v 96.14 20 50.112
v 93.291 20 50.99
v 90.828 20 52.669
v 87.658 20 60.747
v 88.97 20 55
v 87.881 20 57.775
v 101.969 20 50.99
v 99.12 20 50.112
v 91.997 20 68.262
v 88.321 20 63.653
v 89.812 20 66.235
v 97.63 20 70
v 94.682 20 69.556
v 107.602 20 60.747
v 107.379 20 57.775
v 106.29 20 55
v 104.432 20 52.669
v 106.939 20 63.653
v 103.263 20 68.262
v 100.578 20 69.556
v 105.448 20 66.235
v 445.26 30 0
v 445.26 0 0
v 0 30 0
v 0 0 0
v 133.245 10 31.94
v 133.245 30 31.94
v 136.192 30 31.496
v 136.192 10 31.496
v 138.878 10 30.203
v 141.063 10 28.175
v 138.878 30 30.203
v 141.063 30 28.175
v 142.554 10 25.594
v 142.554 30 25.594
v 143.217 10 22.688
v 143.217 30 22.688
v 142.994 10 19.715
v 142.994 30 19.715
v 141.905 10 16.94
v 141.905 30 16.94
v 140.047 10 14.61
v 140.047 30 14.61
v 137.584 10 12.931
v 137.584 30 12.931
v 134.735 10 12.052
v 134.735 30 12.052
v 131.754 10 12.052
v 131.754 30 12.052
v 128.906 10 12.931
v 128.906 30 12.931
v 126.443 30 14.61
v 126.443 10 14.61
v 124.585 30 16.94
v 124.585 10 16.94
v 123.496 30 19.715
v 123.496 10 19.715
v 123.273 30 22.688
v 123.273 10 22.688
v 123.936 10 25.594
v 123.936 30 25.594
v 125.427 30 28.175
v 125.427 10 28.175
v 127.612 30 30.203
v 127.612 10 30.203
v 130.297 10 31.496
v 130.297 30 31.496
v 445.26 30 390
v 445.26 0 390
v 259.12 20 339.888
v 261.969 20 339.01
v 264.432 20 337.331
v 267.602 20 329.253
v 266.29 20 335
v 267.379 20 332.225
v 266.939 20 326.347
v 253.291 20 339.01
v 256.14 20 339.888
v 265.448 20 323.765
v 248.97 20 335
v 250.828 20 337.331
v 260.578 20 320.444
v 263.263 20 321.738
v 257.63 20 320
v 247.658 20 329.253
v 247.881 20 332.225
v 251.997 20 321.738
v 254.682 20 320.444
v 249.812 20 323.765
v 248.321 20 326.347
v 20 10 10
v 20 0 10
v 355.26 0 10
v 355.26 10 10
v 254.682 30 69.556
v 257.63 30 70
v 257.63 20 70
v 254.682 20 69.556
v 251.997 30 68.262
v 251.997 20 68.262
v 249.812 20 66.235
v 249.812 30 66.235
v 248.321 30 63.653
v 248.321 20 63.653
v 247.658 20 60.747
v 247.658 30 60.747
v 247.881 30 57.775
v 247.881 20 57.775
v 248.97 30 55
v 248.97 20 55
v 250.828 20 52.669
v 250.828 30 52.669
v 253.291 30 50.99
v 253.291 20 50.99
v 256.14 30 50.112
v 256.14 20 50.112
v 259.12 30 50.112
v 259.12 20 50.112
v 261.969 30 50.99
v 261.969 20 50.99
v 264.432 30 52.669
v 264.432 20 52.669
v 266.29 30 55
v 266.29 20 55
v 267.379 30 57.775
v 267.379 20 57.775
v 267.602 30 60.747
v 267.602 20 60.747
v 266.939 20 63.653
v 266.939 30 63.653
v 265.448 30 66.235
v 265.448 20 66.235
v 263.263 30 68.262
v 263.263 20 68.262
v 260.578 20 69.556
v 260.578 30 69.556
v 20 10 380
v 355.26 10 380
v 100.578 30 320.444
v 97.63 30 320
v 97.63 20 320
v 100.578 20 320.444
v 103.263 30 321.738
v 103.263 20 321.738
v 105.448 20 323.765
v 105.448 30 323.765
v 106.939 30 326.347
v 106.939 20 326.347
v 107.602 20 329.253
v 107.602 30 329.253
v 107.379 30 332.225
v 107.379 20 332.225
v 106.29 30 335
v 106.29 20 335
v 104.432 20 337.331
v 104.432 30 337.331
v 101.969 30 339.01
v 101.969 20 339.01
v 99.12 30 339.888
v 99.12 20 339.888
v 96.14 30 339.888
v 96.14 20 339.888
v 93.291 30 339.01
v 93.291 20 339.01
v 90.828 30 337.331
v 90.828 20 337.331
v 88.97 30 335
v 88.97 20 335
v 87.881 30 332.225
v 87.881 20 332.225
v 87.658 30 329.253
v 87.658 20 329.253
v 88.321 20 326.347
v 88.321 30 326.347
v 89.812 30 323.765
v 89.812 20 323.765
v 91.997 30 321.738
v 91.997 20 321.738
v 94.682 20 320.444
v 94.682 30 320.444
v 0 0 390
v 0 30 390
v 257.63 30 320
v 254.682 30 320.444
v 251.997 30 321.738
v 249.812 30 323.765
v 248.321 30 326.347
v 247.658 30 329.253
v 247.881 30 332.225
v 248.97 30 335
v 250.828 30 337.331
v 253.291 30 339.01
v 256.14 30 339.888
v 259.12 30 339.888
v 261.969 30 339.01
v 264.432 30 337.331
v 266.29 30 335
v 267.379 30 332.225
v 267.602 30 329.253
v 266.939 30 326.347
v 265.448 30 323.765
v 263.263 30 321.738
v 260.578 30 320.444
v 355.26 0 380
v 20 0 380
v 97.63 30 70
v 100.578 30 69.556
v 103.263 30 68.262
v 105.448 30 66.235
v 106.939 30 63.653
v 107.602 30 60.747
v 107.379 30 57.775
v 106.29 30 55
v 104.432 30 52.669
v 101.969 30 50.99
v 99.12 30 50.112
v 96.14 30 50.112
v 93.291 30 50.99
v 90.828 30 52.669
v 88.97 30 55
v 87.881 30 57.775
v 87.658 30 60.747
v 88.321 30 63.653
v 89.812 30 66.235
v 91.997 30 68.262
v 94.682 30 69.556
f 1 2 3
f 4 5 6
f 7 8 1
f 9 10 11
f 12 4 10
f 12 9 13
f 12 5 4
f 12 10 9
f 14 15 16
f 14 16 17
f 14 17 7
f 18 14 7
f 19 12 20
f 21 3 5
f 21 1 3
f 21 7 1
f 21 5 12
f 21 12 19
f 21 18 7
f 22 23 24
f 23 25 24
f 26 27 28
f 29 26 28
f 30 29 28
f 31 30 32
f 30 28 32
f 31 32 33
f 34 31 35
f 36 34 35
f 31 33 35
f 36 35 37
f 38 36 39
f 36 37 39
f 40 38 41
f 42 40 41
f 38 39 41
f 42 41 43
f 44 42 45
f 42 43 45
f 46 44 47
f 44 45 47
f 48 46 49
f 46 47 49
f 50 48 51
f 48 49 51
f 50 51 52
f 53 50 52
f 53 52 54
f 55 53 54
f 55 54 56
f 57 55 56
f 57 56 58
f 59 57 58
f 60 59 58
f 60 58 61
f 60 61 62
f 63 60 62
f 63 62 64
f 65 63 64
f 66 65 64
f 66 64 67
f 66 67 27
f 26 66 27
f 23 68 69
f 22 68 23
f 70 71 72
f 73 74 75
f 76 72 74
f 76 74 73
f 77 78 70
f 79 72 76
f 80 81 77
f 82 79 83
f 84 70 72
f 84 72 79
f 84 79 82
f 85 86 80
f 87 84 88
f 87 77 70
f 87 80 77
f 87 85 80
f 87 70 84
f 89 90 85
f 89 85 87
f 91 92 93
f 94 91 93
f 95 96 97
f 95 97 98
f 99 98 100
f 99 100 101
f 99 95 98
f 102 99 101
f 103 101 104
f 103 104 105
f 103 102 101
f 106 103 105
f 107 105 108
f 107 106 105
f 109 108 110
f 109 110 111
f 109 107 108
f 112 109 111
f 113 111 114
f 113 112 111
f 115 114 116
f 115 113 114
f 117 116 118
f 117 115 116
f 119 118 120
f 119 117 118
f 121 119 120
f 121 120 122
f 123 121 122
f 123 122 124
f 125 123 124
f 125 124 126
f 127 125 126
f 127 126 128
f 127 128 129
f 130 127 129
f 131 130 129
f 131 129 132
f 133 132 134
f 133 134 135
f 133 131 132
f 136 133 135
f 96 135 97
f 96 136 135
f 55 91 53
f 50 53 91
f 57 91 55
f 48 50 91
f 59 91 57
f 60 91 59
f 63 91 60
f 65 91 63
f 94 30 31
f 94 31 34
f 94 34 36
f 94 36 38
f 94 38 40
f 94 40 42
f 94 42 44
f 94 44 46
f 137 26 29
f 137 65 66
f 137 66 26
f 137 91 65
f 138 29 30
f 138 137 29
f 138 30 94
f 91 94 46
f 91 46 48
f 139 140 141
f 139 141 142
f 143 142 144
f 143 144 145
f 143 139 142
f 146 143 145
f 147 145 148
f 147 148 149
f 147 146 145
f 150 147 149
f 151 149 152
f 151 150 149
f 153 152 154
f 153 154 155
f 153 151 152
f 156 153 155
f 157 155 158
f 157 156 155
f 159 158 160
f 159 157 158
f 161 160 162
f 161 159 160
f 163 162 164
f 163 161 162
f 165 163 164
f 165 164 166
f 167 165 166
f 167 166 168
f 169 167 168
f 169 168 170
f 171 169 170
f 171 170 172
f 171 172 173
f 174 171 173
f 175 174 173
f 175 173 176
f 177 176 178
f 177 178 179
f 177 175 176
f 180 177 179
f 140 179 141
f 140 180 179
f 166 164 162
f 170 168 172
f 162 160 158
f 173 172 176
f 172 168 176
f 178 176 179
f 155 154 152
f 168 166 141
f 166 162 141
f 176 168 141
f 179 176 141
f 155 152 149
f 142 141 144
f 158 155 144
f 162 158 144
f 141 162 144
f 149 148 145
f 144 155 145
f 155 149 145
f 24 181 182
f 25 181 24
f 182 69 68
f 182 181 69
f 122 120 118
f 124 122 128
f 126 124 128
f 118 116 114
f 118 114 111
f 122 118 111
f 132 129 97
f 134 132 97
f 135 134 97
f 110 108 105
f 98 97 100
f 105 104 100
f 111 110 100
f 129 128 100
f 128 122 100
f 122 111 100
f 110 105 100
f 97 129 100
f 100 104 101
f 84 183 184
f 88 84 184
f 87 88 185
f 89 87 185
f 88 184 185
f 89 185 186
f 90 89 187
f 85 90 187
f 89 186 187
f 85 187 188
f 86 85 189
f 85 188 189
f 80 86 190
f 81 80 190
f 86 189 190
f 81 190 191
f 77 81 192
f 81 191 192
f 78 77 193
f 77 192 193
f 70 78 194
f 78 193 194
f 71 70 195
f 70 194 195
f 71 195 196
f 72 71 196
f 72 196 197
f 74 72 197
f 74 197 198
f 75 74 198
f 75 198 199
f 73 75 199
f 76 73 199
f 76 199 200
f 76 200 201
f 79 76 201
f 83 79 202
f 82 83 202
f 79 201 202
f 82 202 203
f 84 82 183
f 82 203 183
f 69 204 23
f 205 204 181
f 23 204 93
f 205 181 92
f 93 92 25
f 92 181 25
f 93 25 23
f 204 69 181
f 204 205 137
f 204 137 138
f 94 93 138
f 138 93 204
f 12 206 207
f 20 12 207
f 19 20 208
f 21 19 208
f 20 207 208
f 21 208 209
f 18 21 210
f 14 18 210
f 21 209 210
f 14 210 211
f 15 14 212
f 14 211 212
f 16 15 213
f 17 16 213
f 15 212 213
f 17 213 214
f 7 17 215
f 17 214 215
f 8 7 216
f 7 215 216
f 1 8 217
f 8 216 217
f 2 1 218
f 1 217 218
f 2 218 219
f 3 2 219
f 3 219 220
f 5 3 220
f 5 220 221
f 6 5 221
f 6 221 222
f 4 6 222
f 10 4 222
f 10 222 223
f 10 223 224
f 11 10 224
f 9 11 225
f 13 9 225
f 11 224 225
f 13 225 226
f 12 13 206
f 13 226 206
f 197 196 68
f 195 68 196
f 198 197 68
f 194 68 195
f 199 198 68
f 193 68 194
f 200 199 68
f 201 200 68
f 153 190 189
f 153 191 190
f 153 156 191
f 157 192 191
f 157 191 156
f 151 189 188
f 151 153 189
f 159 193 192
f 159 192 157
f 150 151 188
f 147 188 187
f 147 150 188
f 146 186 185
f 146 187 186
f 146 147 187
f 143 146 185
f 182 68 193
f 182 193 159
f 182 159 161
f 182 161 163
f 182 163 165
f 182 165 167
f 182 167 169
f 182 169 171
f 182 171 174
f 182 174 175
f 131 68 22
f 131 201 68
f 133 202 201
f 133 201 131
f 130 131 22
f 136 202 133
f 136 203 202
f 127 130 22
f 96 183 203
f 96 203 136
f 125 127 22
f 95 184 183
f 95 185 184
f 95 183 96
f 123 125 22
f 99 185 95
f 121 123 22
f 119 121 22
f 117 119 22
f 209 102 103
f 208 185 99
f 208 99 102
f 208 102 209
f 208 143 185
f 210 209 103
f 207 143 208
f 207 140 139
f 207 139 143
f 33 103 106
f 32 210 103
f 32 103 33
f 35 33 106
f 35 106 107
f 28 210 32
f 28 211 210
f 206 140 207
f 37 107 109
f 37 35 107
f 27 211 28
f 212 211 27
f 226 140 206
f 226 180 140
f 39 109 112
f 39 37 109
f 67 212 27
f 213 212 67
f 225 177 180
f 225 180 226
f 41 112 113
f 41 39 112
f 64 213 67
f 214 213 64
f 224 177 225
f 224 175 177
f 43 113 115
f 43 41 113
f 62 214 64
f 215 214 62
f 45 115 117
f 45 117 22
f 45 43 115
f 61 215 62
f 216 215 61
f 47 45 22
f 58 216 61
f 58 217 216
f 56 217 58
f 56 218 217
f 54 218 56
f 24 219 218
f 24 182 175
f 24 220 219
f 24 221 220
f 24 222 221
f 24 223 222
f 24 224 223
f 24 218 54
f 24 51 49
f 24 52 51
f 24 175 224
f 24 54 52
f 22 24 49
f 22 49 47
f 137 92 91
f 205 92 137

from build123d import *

# Parameters (mm, degrees)
SKETCH1_W               = 355.26
SKETCH1_H               = 390
BOSS_EXTRUDE1_DEPTH     = 30
SKETCH3_W               = 390
SKETCH3_H               = 30
BOSS_EXTRUDE2_DEPTH     = 90
SKETCH4_R               = 10
CUT_EXTRUDE1_DEPTH      = 10
MIRROR2_COPY_1_SKETCH_R = 10
MIRROR2_COPY_1_DEPTH    = 10
SKETCH7_W               = 335.26
SKETCH7_H               = 370
CUT_EXTRUDE3_DEPTH      = 10
SKETCH8_R               = 10
CUT_EXTRUDE4_DEPTH      = 87


with BuildPart() as part:
    # Sketch1 → Boss-Extrude1 (new body)
    with BuildSketch(Plane(origin=(0, 0, 0), x_dir=(1, 0, 0), z_dir=(0, 1, 0))):
        with Locations((177.63, -195)):
            Rectangle(SKETCH1_W, SKETCH1_H)
    extrude(amount=BOSS_EXTRUDE1_DEPTH)

    # Sketch3 → Boss-Extrude2 (add)
    with BuildSketch(Plane(origin=(355.26, 0, 0), x_dir=(0, 0, -1), z_dir=(1, 0, 0))):
        with Locations((-195, 15)):
            Rectangle(SKETCH3_W, SKETCH3_H)
    extrude(amount=BOSS_EXTRUDE2_DEPTH)

    # Sketch4 → Cut-Extrude1 (cut)
    with BuildSketch(Plane(origin=(0, 30, 0), x_dir=(1, 0, 0), z_dir=(0, 1, 0))):
        with Locations(Location((97.63, -60, 0), (0, 0, 270))):
            Circle(SKETCH4_R)
    cut_extrude1 = extrude(amount=-CUT_EXTRUDE1_DEPTH, mode=Mode.SUBTRACT)

    # Mirror1: Cut-Extrude1 across plane
    add(cut_extrude1.mirror(Plane.ZY.offset(-177.63)), mode=Mode.SUBTRACT)

    # Mirror2: Cut-Extrude1 across plane
    add(cut_extrude1.mirror(Plane.XY.offset(195)), mode=Mode.SUBTRACT)

    # Mirror2 copy 1 sketch → Mirror2 copy 1 (cut)
    with BuildSketch(Plane(origin=(355.26, 30, 390), x_dir=(-1, 0, 0), z_dir=(0, 1, 0))):
        with Locations(Location((97.63, -60, 0), (0, 0, 270))):
            Circle(MIRROR2_COPY_1_SKETCH_R)
    extrude(amount=-MIRROR2_COPY_1_DEPTH, mode=Mode.SUBTRACT)

    # Sketch7 → Cut-Extrude3 (cut)
    with BuildSketch(Plane.XZ):
        with Locations((187.63, 195)):
            Rectangle(SKETCH7_W, SKETCH7_H)
    extrude(amount=-CUT_EXTRUDE3_DEPTH, mode=Mode.SUBTRACT)

    # Sketch8 → Cut-Extrude4 (cut)
    with BuildSketch(Plane(origin=(0, 30, 0), x_dir=(1, 0, 0), z_dir=(0, 1, 0))):
        with Locations(Location((133.244825989, -21.940410103, 0), (0, 0, 270))):
            Circle(SKETCH8_R)
    extrude(amount=-CUT_EXTRUDE4_DEPTH, mode=Mode.SUBTRACT)


solid = part.part
